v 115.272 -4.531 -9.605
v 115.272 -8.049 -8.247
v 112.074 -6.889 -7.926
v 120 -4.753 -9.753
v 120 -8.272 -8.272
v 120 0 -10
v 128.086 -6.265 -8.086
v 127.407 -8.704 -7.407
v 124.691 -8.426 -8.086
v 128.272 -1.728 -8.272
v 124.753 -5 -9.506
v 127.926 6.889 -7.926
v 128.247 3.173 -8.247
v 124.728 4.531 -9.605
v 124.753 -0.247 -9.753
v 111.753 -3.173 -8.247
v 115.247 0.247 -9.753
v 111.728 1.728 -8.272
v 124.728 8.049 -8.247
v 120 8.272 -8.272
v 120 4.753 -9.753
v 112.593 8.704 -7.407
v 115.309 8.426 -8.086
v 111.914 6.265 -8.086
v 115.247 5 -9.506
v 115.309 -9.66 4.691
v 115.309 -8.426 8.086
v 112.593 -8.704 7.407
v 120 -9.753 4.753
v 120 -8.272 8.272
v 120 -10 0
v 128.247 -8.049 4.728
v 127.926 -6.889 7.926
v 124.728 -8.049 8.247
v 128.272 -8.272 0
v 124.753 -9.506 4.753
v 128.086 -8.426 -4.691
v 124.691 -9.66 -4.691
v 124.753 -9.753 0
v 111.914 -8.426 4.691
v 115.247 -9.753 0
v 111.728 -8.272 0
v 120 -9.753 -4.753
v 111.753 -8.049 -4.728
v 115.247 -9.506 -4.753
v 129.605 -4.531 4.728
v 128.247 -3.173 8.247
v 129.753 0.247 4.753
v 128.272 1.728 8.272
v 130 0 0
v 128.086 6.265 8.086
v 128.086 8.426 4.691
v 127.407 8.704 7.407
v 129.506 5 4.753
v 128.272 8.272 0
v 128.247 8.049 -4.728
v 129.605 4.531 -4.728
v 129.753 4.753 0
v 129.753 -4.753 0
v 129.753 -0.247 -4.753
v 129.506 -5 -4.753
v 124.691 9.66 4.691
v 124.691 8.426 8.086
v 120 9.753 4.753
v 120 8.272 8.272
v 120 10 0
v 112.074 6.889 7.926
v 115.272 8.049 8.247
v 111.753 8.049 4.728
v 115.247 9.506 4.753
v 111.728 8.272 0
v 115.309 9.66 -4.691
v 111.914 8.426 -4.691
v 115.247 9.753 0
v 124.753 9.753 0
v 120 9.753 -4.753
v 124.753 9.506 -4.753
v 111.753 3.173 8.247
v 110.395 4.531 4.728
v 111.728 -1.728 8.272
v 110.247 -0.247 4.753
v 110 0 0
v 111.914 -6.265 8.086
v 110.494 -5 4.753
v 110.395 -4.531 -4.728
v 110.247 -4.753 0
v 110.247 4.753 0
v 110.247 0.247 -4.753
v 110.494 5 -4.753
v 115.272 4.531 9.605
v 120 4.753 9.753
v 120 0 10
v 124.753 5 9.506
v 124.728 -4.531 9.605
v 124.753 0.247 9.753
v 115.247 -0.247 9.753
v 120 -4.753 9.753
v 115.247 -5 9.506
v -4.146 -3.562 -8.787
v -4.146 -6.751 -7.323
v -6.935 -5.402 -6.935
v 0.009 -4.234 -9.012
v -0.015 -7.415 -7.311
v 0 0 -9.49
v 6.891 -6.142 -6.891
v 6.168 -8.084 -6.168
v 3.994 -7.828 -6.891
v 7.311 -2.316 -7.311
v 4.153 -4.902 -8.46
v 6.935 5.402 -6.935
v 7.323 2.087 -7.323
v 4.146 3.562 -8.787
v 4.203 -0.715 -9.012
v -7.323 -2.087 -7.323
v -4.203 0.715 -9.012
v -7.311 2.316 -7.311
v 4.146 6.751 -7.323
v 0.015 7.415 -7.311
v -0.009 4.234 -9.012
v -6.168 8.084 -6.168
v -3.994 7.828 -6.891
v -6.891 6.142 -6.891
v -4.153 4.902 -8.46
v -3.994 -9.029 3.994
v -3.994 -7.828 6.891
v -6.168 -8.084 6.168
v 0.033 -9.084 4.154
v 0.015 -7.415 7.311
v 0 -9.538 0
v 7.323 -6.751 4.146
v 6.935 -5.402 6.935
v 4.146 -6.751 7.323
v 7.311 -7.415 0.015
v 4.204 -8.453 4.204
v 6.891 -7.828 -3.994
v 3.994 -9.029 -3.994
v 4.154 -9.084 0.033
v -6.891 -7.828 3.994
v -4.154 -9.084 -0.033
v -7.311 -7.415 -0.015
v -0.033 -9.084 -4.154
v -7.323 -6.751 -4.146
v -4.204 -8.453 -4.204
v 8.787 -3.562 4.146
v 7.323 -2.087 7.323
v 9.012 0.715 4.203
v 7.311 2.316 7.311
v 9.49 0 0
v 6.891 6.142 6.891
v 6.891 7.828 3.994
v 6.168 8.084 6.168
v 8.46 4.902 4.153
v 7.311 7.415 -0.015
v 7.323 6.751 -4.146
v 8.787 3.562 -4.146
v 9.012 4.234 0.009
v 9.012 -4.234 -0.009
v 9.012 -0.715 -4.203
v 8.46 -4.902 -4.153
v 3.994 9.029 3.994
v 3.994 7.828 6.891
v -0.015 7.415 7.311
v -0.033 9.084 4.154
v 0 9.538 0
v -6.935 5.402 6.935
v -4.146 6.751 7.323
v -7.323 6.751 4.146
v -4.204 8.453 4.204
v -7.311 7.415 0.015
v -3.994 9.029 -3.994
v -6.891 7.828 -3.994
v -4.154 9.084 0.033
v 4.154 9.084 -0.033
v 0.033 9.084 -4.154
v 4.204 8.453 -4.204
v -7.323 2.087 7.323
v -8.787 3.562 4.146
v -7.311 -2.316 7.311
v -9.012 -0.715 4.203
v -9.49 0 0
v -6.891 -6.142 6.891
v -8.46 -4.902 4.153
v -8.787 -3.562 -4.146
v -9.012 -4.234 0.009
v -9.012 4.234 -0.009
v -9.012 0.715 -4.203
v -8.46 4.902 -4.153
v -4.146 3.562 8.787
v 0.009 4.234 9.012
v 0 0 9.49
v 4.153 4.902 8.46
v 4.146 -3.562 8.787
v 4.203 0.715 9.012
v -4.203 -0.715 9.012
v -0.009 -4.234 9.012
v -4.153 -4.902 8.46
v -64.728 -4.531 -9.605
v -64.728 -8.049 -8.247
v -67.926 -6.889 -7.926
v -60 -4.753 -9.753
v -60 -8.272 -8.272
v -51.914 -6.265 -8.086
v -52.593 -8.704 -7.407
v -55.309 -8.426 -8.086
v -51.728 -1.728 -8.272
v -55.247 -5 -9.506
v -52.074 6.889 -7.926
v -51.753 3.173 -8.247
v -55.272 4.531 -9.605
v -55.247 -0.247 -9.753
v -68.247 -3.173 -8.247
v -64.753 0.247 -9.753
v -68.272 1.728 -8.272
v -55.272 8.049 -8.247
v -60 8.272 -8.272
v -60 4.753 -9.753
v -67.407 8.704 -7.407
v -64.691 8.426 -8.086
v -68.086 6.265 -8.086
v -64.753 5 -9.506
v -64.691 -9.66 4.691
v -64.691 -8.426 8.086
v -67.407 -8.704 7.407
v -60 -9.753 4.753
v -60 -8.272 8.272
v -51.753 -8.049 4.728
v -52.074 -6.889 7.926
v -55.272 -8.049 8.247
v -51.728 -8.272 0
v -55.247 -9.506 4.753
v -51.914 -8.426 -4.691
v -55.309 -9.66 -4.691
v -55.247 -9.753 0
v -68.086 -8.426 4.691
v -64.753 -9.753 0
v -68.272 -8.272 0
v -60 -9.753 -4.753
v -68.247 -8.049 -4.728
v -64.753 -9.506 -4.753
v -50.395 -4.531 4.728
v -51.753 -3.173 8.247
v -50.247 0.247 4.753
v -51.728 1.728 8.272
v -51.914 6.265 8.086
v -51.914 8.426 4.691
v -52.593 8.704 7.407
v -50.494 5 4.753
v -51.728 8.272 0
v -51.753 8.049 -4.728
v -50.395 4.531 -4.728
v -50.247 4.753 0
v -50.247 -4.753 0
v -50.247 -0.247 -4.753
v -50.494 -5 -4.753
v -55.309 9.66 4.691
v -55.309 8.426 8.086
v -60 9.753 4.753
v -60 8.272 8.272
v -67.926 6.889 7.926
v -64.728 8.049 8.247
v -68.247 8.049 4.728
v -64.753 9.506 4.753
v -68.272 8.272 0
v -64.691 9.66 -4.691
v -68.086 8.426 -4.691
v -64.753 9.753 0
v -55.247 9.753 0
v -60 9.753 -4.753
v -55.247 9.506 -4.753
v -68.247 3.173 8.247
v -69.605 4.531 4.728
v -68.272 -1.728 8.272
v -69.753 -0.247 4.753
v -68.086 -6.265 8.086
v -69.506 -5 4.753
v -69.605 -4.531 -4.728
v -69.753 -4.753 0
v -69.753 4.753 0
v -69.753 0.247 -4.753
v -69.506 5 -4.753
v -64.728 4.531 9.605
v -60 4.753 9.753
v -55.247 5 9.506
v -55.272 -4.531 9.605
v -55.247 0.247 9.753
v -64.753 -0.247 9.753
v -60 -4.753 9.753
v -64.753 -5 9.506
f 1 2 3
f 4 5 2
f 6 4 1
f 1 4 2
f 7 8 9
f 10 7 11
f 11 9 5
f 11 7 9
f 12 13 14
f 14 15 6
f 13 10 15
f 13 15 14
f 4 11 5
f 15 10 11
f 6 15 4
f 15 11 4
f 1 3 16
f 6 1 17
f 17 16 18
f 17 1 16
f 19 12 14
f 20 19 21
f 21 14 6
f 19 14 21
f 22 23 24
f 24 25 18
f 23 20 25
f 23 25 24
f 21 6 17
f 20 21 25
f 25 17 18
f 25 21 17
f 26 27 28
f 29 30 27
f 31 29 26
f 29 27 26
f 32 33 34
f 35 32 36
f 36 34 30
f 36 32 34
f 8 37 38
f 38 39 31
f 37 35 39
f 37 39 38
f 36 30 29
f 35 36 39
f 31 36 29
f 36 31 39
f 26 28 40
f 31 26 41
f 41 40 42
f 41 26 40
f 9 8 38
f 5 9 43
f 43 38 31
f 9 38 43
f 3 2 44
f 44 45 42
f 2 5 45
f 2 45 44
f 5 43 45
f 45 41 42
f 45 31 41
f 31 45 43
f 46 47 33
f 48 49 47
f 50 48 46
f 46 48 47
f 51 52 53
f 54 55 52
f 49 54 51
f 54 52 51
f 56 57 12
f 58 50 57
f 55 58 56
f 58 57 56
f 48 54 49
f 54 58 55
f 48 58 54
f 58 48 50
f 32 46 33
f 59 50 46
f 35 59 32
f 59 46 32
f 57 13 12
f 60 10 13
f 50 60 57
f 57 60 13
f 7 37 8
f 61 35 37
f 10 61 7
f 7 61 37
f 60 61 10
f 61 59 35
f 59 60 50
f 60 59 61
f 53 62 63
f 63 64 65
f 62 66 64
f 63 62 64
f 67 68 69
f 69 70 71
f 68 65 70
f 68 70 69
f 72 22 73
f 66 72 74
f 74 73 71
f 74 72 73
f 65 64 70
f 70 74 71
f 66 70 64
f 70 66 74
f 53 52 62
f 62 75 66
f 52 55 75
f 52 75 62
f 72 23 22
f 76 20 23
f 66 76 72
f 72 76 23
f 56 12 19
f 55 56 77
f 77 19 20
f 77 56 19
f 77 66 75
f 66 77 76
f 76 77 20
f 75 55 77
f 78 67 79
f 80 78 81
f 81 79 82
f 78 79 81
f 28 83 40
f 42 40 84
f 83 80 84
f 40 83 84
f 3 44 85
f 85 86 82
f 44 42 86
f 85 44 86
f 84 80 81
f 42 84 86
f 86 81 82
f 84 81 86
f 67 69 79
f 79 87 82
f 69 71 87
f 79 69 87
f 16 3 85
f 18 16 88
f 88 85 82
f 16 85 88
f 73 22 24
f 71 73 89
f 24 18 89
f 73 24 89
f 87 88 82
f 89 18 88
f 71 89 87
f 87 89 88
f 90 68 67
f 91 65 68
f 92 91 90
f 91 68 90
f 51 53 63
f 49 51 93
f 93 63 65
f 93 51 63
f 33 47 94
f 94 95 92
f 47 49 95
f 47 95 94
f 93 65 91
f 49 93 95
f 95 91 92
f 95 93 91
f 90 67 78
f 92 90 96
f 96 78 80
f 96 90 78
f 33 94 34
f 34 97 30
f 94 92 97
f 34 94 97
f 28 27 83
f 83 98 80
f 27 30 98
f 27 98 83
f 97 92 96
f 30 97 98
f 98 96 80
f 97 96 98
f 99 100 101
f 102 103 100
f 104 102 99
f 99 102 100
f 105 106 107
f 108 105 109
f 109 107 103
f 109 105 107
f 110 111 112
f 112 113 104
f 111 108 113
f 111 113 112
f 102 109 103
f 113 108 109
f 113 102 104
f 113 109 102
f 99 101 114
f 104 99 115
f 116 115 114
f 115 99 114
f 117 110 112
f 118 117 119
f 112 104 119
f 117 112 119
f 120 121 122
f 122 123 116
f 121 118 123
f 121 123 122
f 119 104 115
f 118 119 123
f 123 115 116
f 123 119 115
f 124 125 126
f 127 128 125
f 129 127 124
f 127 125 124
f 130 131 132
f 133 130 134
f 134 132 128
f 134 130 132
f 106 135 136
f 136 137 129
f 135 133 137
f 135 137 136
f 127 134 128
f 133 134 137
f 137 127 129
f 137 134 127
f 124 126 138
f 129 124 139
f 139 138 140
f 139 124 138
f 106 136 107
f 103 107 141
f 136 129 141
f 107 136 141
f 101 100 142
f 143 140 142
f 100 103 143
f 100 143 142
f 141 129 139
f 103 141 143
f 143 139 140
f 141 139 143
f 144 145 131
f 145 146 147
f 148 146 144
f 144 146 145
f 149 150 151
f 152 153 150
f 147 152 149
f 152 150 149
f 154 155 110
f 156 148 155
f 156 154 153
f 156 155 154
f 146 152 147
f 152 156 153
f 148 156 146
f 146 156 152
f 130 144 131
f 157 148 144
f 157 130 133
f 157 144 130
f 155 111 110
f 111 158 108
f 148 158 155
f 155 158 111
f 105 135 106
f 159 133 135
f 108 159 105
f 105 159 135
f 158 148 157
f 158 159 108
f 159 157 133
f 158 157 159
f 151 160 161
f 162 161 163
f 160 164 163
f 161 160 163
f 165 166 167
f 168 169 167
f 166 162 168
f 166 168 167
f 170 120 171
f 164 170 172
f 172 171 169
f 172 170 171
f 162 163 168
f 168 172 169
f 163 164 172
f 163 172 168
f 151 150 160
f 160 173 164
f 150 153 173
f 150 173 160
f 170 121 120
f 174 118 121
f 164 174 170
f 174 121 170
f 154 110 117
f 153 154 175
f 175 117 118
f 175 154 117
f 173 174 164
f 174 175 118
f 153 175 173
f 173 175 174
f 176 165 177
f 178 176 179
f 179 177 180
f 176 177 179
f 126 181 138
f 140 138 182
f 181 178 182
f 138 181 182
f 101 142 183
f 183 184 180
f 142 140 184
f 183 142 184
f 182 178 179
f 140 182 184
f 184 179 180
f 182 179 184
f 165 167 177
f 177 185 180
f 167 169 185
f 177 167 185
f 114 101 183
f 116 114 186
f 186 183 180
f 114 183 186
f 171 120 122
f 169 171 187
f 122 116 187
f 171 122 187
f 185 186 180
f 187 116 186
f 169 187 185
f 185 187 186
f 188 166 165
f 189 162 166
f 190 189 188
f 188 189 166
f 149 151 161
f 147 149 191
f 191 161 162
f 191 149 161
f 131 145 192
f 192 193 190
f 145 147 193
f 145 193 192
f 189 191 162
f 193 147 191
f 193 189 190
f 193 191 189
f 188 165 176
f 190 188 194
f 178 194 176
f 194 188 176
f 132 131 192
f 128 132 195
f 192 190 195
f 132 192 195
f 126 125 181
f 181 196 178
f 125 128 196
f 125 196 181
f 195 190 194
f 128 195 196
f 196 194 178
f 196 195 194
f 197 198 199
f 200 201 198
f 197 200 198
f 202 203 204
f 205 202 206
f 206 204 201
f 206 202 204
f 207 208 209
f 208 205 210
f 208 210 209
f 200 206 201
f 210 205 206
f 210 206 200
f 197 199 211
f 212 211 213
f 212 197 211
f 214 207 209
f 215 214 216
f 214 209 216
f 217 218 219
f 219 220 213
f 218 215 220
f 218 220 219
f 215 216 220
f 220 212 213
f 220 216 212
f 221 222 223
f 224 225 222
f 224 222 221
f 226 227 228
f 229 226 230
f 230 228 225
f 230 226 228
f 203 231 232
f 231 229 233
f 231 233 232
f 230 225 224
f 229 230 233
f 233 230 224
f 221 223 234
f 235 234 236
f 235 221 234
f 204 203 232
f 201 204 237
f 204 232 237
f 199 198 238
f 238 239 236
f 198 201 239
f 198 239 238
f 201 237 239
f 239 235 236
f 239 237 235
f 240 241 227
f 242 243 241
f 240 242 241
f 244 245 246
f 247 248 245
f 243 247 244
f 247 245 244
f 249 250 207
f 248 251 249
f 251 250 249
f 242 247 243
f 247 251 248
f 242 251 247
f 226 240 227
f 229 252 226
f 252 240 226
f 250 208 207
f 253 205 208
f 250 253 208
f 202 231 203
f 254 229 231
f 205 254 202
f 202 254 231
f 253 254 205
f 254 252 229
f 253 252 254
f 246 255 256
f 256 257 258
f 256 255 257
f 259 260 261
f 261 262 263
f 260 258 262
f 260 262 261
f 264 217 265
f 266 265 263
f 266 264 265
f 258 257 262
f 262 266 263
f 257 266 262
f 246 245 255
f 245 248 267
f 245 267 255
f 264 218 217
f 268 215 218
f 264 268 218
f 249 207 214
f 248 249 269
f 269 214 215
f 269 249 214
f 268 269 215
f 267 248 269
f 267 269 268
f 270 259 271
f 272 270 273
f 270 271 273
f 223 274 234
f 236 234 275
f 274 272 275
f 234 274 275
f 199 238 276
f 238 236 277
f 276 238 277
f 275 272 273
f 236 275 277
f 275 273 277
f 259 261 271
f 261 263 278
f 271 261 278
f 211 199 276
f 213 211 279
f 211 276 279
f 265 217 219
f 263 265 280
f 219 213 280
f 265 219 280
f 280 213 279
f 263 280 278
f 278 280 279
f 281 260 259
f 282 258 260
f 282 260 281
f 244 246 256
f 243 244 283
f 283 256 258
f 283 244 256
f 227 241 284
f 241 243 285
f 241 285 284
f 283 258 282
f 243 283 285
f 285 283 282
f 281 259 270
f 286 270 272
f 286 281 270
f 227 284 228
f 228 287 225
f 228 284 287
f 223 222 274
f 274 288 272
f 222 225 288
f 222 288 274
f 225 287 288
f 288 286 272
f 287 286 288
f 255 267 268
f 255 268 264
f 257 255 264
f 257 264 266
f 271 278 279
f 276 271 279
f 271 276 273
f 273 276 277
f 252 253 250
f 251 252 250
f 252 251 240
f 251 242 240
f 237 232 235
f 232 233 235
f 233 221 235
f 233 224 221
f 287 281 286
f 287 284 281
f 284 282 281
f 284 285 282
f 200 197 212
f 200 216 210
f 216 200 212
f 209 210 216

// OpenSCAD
//demo mesh
Flat_treshold=0.009;
  //mesh=trimesh(cubemesh4() );
mesh=trimesh(cubemesh3() );
  //  mesh= (diamond() );

 // mesh=fp_flip(bunny());

echo(len(  mesh[0]),len(mesh[1]));

midmesh =  relax( tesselate( (mesh),2)) ;
 dmaesh= fp_decimate( midmesh );
 //nm = fp_decimate (tesselate(dmaesh,0));


 newmesh=relax (midmesh);
translate ([120,0,0]) polyhedron(midmesh[0], midmesh[1]);

// translate ([60,0,0]) polyhedron(nm[0], nm[1]);
translate ([ 0,0,0]) polyhedron(newmesh[0], newmesh[1]);

translate ([-60,0,0]) polyhedron(dmaesh[0], dmaesh[1]);
  // for (i = [0: len(newmesh) - 1]) echo(newmesh[i]);
echo(len( midmesh[0]),len(dmaesh[0]));
echo(len( dmaesh[0]),len(dmaesh[0]));


function fp_decimate (m,i=0,changed=0  )=
let(points=m[0],faces=m[1],n= neighbours(m) )
i<len(points)-1?
let(
removies=[for(k=[0:max(0, len(n[i])-1 )] ) faces[n[i][k]]],
 r=flattness(m,removies) 
//, e=echo(i,"removies",removies,"flattness",r)
)

r<=Flat_treshold? 
let(
newm=fp_decimateinidex(m,i,removies),
newch=len(newm[0])==len(m[0])?changed:changed+1,
newi=len(newm[0])==len(m[0])?i  :i
)
fp_decimate (newm,newi,newch  ) 
:fp_decimate (m,i+1,changed  )
:
changed>0?

 fp_decimate( m)
:
fusepoints(m)

;

/*needs change*/

function fp_decimateinidex(m,j,n)=
let( points=m[0],faces=m[1])
let(
removies=n,
newfaces=fp_removevertex(m,removies,j,alt=3),
r= flattness(m,newfaces),
h= flattness(m,removies)

) 
r<=h?
    let(nn=notneighboursofi (m,j),keepers= [for(k=[0:len(nn)-1]) faces[nn[k]]]
 //, e=echo("n",removies,"j",keepers)
)
    [points, concat(keepers,newfaces)]
    :
m
;
function fp_removevertex(m,removies,vertex,alt=0)=
let(points=m[0] )
let(

n= avrg([for(i=[0:max(0,len(removies)-1)])
p2n(  [points[removies[i][0]], points[removies[i][1]], points[removies[i][2]]])    ] ),


d= fp_tricylceb(removies,vertex),
c= fp_segorder(d),
e=fp_segcollapse(c),
g=shuffle(e,alt-round(rnd(2))),
f=fp_triangulate(m,g,n)
//,eco=echo( len(d),len(c))
)
 len(removies)>2&&len(c)==len(d)&&len(f)+2==len(removies)?f: removies 
;
function flattness(m,n)=

let(points=m[0],faces=m[1], 

normals=[for(i=[0:max(0,len(n)-1)])p2n(
 [
//let(e=echo("normals",n))
points[n[i][0]],
points[n[i][1]],
points[n[i][2]] 
])

],
ne=normeq(normals)



)  

ne
;


/*needs change*/

function newflattness(m)=

let(points=m[0],faces=m[1],

normals=[for(i=[0:max(0,len(m)-1)])p2n(m[i])

],
ne=normeq(normals)


) 
ne
;
function fp_glue(m)= let (
   hashed = fp_addhash(fp_flatten(m)), /*flatten and pair points with hash*/
   sorted = fp_hashQS(hashed),/*sort by hash*/
   unique = fp_unique(sorted),/*unique by hash*/
   newmesh = [fp_removehash(unique), fp_relink(unique, m)])/* combine to new mesh*/
 newmesh;
 function fusepoints(m) =
 let (
   privatetized = fp_privatetize(m), /* convert indexed polyhedron */
 newmesh= fp_glue(privatetized))
 newmesh;

 function fp_privatetize(m) = 
/* convert indexed polyhedron to vetrtex polygons with private vertex*/
 let (p = m[0], f = m[1], l = max(0,len(f) - 1))[
   for (i = [0: l])[     for (j = [0: len(f[i]) - 1]) p[f[i][j]]   ]];

 function fp_flatten(l) = [   for (a = l)     for (b = a) b ];
 
 function fp_addhash(m) = 
/*pair each point with a hash of the point*/
[   for (i = [0: len(m) - 1])[fp_encode(m[i]), m[i]] ];

 function fp_encode(v) =
 let (xseed = round(fp_rnd(1e8, -1e8, round(v.x * 1e6))),
   yseed = round(fp_rnd(1e8, -1e8, xseed + round(v.y * 1e6))),
   zseed = round(fp_rnd(1e8, -1e8, yseed + round(v.z * 1e6))),
   hash =   round(fp_rnd(1e8, -1e8, zseed)))
 hash;

 function fp_hashQS(arr) = !(len(arr) > 0) ? [] :
 let (pivot = arr[floor(len(arr) / 2)][0],
 lesser = [ for (y = [0: len(arr) - 1]) if (arr[y][0] < pivot) arr[y] ],
 equal = [ for (y = [0: len(arr) - 1]) if (arr[y][0] == pivot) arr[y] ],
 greater = [ for (y = [0: len(arr) - 1]) if (arr[y][0] > pivot) arr[y] ])
 concat(fp_hashQS(lesser), equal, fp_hashQS(greater));

 function fp_unique(m) = [   for (i = [0: len(m) - 1])     if (m[i] != m[i - 1]) m[i] ];

 function fp_rnd(a = 1, b = 0, s = []) = s == [] ? (rands(min(a, b), max(   a, b), 1)[0]) : (rands(min(a, b), max(a, b), 1, s)[0]); 

 function fp_removehash(m) = [   for (i = [0: len(m) - 1]) m[i][1] ];
 function fp_relink(p, f) =
/*convert polygons with private vertex to indexed by searching for hash matches  */
 let (l = len(f) - 1)[   for (i = [0: l])[     for (j = [0: len(f[i]) - 1]) search(fp_encode(f[i][j]), p)[0]] ];
 
 function fp_flip(w)=[w[0],[for(i=[0:len(w[1])-1])[w[1][i][0],w[1][i][2],w[1][i][1]]]];

function lerp(start, end, bias) = (end * bias + start * (1 - bias));

function relax(m, c =  2,nn=0) = 
let(points=m[0], faces=m[1], n=nn==0?neighbours(m):nn)
c > 0 ?
let(
midpoints = 
[ for (i = [0: len(faces) - 1]) avrg( 
[points[faces[i][0]], points[faces[i][1]], points[faces[i][2]]]
) ], 

points2 = [ for (i = [0: len(points) - 1]) len(
n[i]) > 0 ?  avrg([ for (j = [0: len(n[i]) - 1]) midpoints[ n[i] [j]]
 ])  : points[i] ])

relax([points2, faces]  , c - 1,n)
:
 [points, faces];

function neighbours (m)=let(points=m[0],faces=m[1]) [ for (i = [0: len(points) - 1])[ for (j = [0: len(faces) - 1])
 if (faces[j][0] == i || faces[j][1] == i || faces[j][2] == i || faces[j][3] == i) j] ];
function notneighbours (m)=let(points=m[0],faces=m[1]) [ for (i = [0: len(points) - 1])[ for (j = [0: len(faces) - 1])
 if ( (faces[j][0] != i && faces[j][1] != i && faces[j][2] != i && faces[j][3] != i)) j] ];
function neighboursofi (m,i)=let(points=m[0],faces=m[1])
  [ for (j = [0: len(faces) - 1])
 if (faces[j][0] == i || faces[j][1] == i || faces[j][2] == i || faces[j][3] == i) j] ;
function notneighboursofi (m,i)=let(points=m[0],faces=m[1])
  [ for (j = [0: len(faces) - 1])
 if ( (faces[j][0] != i && faces[j][1] != i && faces[j][2] != i && faces[j][3] != i)) j] ;
function addl(l, c = 0) = c < len(l) - 1 ? l[c] + addl(l, c + 1) : l[
 c];
function avrg(l) = len(l) > 1 ? addl(l) / (len(l)) : l;




function shuffle(b,l=1)=let(
c=concat( [for(i=[1:len(b)-1])b[i]],[b[0]]))
l>0?shuffle(c,l-1):c
;
function fp_tricylceb(b,p)=[for(i=[0:len(b)-1])fp_tricycle (b[i],p)];

function fp_tricycle(f,p)=
fp_is_equal(f[0],p)?
[f[1],f[2]]:
     let(f1=[f[1],f[2],f[0]])
    fp_is_equal(f1[0],p)?
        [f1[1],f1[2]]:
        let(f2=[f1[1],f1[2],f1[0]])
        fp_is_equal(f2[0],p)?[f2[1],f2[2]]:
        f;

function fp_triangulate(m,a,n ,count=0)=
let(points=m[0],faces=m[1])
count>len(a)?
a
:
len(a)<=3?
[[a[0],a[1],a[2]]]:
sign(dot(p2n([points[a[0]],points[a[1]],points[a[2]]  ]),n))>0?
let(b=concat([for(i=[2:len(a)-1])a[i]],[a[0]] )) 
concat([[a[0],a[1],a[2]]],fp_triangulate( m,shuffle(b,2),n )):fp_triangulate(m, shuffle(a,1),n,count+1 );

function fp_trimeshulate(a)=len(a)>3?let(b=concat([for(i=[2:len(a)-1])a[i]],[a[0]] )
) concat([[a[0],a[1],a[2]]],fp_trimeshulate(shuffle(b,2))):[[a[0],a[1],a[2]]];



 function fp_is_equal(a, b, d=1e-16) = (a==b) || (abs(a-b)<d) || (norm(a-b)<d);
    function flatten(l) = [ for (li = l, lij = li) lij ];

function rnd(a = 1, b = 0) = (rands(min(a, b), max(a, b), 1)[0]);

 function fp_segorder(n,acc=0,c=0)=c<=len(n)-1?let(newacc= (acc==0)?[n[0]]:let(lookfor= acc[0][0]) concat([for(i=[0:len(n)-1])if(fp_is_equal(lookfor,n[i][1])==true)n[i]],acc ))fp_segorder(n,newacc,c+1):acc;

function fp_segcollapse(n)=
[for(i=[0:len(n)-1])n[i][0]];

function normeq(pl) = 

let (list= [
 for (i = [0: len(pl) - 1],j = [0: len(pl) - 1])
 
 (-1 + dot(pl[i], pl[j])  )
   ]
,
sums = avrg(list) )
 
abs(sums)
 ;

function p2n4(p) =un(p2n(p0,p1,p3)+p2n(p3,p1,p2));
function p2n(p) =
let (pa=p[0], pb=p[1], pc=p[2],
u = pa - pb, v = pa - pc) un([u[1] * v[2] - u[2] * v[1], u[2] *
 v[0] - u[0] * v[2], u[0] * v[1] - u[1] * v[0]
]);
function un(v) = v / max(len3(v), 0.000001) * 1; // div by zero safe unit normal
function dot(v1, v2) = v1[0] * v2[0] + v1[1] * v2[1] + v1[2] * v2[2];
function addl(l, c = 0) = c < len(l) - 1 ? l[c] + addl(l, c + 1) : l[
 c];
function len3(v) = len(v) > 1 ? sqrt(addl([
 for (i = [0: len(v) - 1]) pow(v[i], 2)
])) : len(v) == 1 ? v[0] : v;

function  trimesh (t)=
let(
t1=t[1],
t2=fp_flatten([for(i=[0:len(t1)-1]) 
 (len( t1[i])==3)?[t1[i]]:[[t1[i][0],t1[i][1],t1[i][2]],[t1[i][0],t1[i][2],t1[i][3]]]     ] )
)[t[0],t2]
;
function tesselate(m,c=1)=
c>=1?
 let (
   pr = fp_privatetize(m), /* convert indexed polyhedron */

 subdv=fp_flatten([for(i=[0:max(0,len(pr)-1)])let(
pr01=lerp(pr[i][0],pr[i][1],0.5),
pr12=lerp(pr[i][1],pr[i][2],0.5),
pr20=lerp(pr[i][2],pr[i][0],0.5)
)[
[pr[i][0],pr01,pr20],
[pr[i][1],pr12,pr01],
[pr[i][2],pr20,pr12],
[pr01,pr12,pr20]

]
]),
 
  newmesh =   fp_glue(subdv)
)
tesselate(newmesh,c-1)
:

m;
 

module trender(t) {
 C0 = (un(rndc()) + [2, 0, 0]);
 C1 = (un(rndc()) + [2, 2, 0]);
 C2 = (un(rndc()) + [0, 2, 2]);
 for (i = [0: max(0, len(t[1]) - 1)]) {
 n = un(p2n(t[0][t[1][i][0]], t[0]
 [t[1][i][1]], t[0][t[1][i][
 2
 ]]));
 color(un((C0 * abs(n[0]) + C1 * abs(n[1]) + C2 * abs(n[2]) + [
 1, 1, 1
 ] * abs(n[2])) / 4)) polyhedron(t[0], [t[1][i]]);
 }
}
function rndc(a = 1, b = 0,seed) = [rnd(a, b,seed),
 rnd(a, b,seed+1), rnd(a, b,seed+2)
];
function bunny()=[[[33.718,-8.247,33.616],[-30.065,-22.111,41.454],[1.142,14.457,35.998],[20.205,-17.34,49.075],[36.378,-2.827,7.022],[-11.251,13.5,5.136],[29.105,-18.728,7.239],[-9.845,8.083,9.951],[-36.86,-24.079,60.289],[-28.976,-3.302,3.436],[-11.413,-13.526,50.148],[28.736,-0.816,42.915],[-32.116,4.195,42.182],[29.812,-7.088,2.935],[-37.993,-15.409,34.838],[-28.78,-18.857,66.373],[-29.289,21.548,77.615],[-28.191,23.665,69.162],[-36.226,-11.242,66.87],[31.967,2.895,30.506],[-25.318,1.605,64.068],[-41.72,-13.563,47.396],[3.505,-27.667,8.246],[18.251,9.502,40.482],[-40.705,-8.309,57.649],[-34.759,-14.864,24.435],[41.326,-8.903,12.497],[7.937,-25.727,1.639],[0.142,18.861,18.906],[37.372,0.543,12.665],[11.469,-25.566,39.178],[-11.3,-25.322,6.98],[16.983,0.961,50.904],[25.417,10.084,22.882],[12.196,16.124,13.812],[-38.798,-23.136,44.566],[-6.906,16.568,23.283],[-11.406,5.707,70.997],[27.876,3.576,10.072],[-29.124,6.104,23.795],[30.252,-19.533,18.403],[-24.95,-3.186,68.402],[-21.5,4.288,1.733],[-20.217,0.035,59.846],[-16.111,-1.157,53.825],[9.791,18.388,28.806],[-20.449,-9.927,10.118],[-5.697,-29.44,3.937],[-14.075,-24.543,1.192],[-38.314,-4.065,30.749],[-17.348,-6.564,61.51],[39.723,-14.873,17.026],[-24.142,-11.883,1.318],[4.044,-18.973,49.654],[-25.128,-21.576,4.037],[28.884,-15.239,42.197],[-7.042,-23.574,16.146],[-22.782,1.057,13.904],[-30.957,-28.833,46.933],[-13.723,10.348,24.112],[-6.4,7,79.935],[0.38,8.58,73.547],[-2.751,-29.774,24.603],[32.871,-16.125,29.207],[-3.623,17.983,31.576],[17.513,4.686,2.883],[-30.017,-27.275,56.561],[13.323,-29.14,13.068],[-20.244,-21.378,18.476],[-20.735,-20.229,49.671],[34.577,-0.469,19.663],[-32.728,2.082,59.206],[1.448,8.004,45.899],[-21.1,-24.65,32.38],[-3.299,14.822,3.265],[37.681,-9.851,21.953],[10.732,-31.947,27.781],[-25.458,13.814,68.264],[14.963,11.754,4.948],[-21.548,-8.801,67.863],[2.005,-5.173,1.969],[-23.472,3.741,51.505],[21.968,-9.013,50.599],[-9.451,7.934,17.546],[41.184,-5.284,20.179],[-39.539,-2.907,46.751],[-39.019,-9.922,42.553],[-16.487,10.221,37.797],[-9.537,-0.368,72.53],[-13.553,-22.428,41.139],[-5.875,-25.824,33.532],[10.433,-17.548,2.653],[-40.968,-17.45,57.613],[-32.842,15.053,71.785],[-4.31,-4.034,51.575],[10.947,-7.696,54.207],[1.296,-30.04,33.917],[-33.833,1.324,66.787],[-27.494,-6.782,16.239],[-21.944,-17.558,61.153],[-38.475,-27.624,50.311],[24.879,-24.385,33.536],[-21.259,-16.919,7.059],[-21.259,-16.919,7.059],[-21.259,-16.919,7.059]],[[80,91,48],[27,48,91],[68,98,46],[48,52,80],[98,25,49],[54,52,48],[42,74,80],[52,42,80],[42,5,74],[6,13,26],[25,98,68],[9,42,52],[46,103,68],[58,35,1],[1,35,21],[80,74,65],[100,35,58],[80,65,13],[91,80,13],[27,91,6],[6,91,13],[47,48,27],[51,75,40],[87,59,39],[5,7,74],[2,72,23],[28,74,7],[54,104,52],[64,28,36],[60,61,37],[39,57,98],[64,45,28],[34,74,28],[31,48,47],[102,54,31],[7,42,57],[59,57,39],[12,81,87],[37,43,41],[2,45,64],[74,34,78],[41,43,20],[59,7,57],[28,45,34],[87,39,12],[45,33,34],[37,41,60],[12,71,81],[34,33,78],[72,2,87],[38,29,65],[65,29,4],[49,12,39],[50,79,99],[94,72,44],[23,11,19],[27,6,67],[72,81,44],[44,81,43],[87,81,72],[70,75,84],[43,81,20],[45,2,23],[29,70,84],[19,33,23],[33,45,23],[32,72,94],[83,7,59],[98,57,46],[57,9,46],[71,85,24],[97,71,24],[97,93,71],[85,12,49],[49,39,98],[9,57,42],[32,94,95],[23,72,32],[71,93,17],[18,24,92],[5,42,7],[86,1,21],[83,59,36],[83,36,7],[36,28,7],[64,36,59],[23,32,11],[93,16,17],[12,85,71],[18,8,15],[92,35,100],[87,2,59],[22,62,56],[9,52,46],[8,92,100],[90,62,96],[14,1,86],[93,97,16],[14,25,73],[25,68,73],[1,14,73],[16,77,17],[30,90,96],[2,64,59],[8,100,66],[77,71,17],[32,82,11],[41,79,60],[15,79,41],[3,55,82],[82,55,11],[10,94,44],[44,50,10],[20,77,16],[79,88,60],[20,71,77],[99,69,10],[21,92,24],[50,99,10],[16,41,20],[8,18,92],[97,41,16],[22,27,67],[51,84,75],[15,66,99],[97,18,41],[55,0,11],[4,26,13],[55,63,0],[70,38,33],[102,46,52],[14,49,25],[75,0,63],[74,78,65],[19,70,33],[38,65,78],[33,38,78],[86,85,49],[97,24,18],[65,4,13],[86,49,14],[70,29,38],[50,61,88],[6,26,51],[37,61,43],[30,76,101],[40,101,67],[101,76,67],[30,101,3],[101,40,63],[55,3,101],[40,75,63],[22,47,27],[67,6,40],[60,88,61],[43,50,44],[19,11,0],[63,55,101],[26,4,29],[84,26,29],[31,54,48],[69,99,66],[58,1,69],[69,66,58],[76,62,67],[3,53,30],[67,62,22],[43,61,50],[30,96,76],[96,62,76],[22,31,47],[53,89,30],[89,90,30],[95,3,82],[56,31,22],[95,53,3],[10,89,53],[90,56,62],[90,73,56],[40,6,51],[89,73,90],[21,85,86],[56,68,31],[0,75,70],[73,68,56],[69,89,10],[68,102,31],[84,51,26],[15,41,18],[89,69,1],[1,73,89],[92,21,35],[82,32,95],[24,85,21],[0,70,19],[71,20,81],[8,66,15],[79,50,88],[66,100,58],[94,53,95],[15,99,79],[10,53,94]]];


function diamond()=



[[[-4.10863, -0.140602, -3.6055], [-3.84601, -3.60175, -1.47346], [-3.97796, -4.24691, -0.613285], [-2.53813, -0.848251, -6.37256], [-2.18844, -1.82373, -4.13948], [-0.0333337, -0.848251, -6.37256], [-0.107152, -1.93214, -3.8401], [-1.97693, -1.14585, -5.02233], [-0.274562, -1.22818, -4.66476], [-3.44904, -3.49388, -1.8379], [-2.53813, -6.1872, 0.213072], [-0.037514, -3.74431, -1.36103], [1.90021, -5.55326, 1.49797], [-2.17048, -4.75789, 0.0422999], [0.38598, -5.22305, 0.760223], [-4.55809, -2.31577, -1.67114], [-6.44044, -0.0759498, -0.538324], [-6.32277, -1.73312, 0.916171], [-5.9166, -0.0467461, -1.88034], [-5.65828, -2.40612, -0.340622], [-6.96031, -0.89379, 0.448986], [-6.65543, -1.13852, -0.358017], [-2.88119, -2.59327, -3.09619], [-0.0989006, -2.70754, -2.83311], [-3.60055, -1.31693, -3.26812], [-2.53813, -2.6279, 0.213072], [-0.0333337, -0.848251, -1.98214], [-0.0333337, -2.6279, 0.213072], [2.15047, -1.95664, -3.656], [3.80216, -1.72573, -3.28922], [1.56304, -1.48258, -4.06836], [3.83668, -0.578218, -3.60172], [2.68802, -3.77158, -1.23882], [2.83805, -5.71606, 1.54781], [5.02919, -3.92323, -0.983753], [3.92337, -5.44133, 1.27551], [2.72541, -4.80807, 0.236576], [5.02994, -4.6583, 0.245474], [7.48106, -0.848251, -4.17735], [7.48106, -4.40755, -1.98214], [6.60705, -3.53789, 1.16426], [2.83029, -2.38095, -3.21484], [5.84927, -2.95745, -2.39152], [2.47146, -0.848251, -1.98214], [2.47146, -2.6279, 0.213072], [6.11744, -0.664958, -2.92074], [6.43254, -3.13239, -0.469602], [7.22257, -2.26381, -1.08929], [6.65182, -0.574654, -2.63706], [8.58868, -1.57387, 0.498089], [9.98586, -2.6279, 0.213072], [8.86667, -0.790335, 0.374336], [8.84603, -0.149826, 1.18825], [-4.87593, 1.50124, -3.97146], [-4.70862, 2.29828, -4.04328], [-2.53813, 0.931399, -6.37256], [-0.0333337, 0.931399, -6.37256], [-2.53813, 2.71105, -6.37256], [-1.92777, -0.992021, -5.03321], [-0.0333337, 2.71105, -6.37256], [-0.995141, 0.58903, -5.22706], [-2.83857, 2.64671, -4.83497], [-0.750299, 2.94568, -5.55327], [-4.06563, 3.93282, -3.18426], [-6.40319, 0.425744, -0.412854], [-5.75953, 0.527687, -2.25537], [-6.99193, 0.969201, 1.4556], [-5.02031, 3.91375, -2.41588], [-6.36916, 1.93535, 0.391189], [-7.54773, 2.71105, 0.213072], [-5.83043, 2.72602, -0.366366], [-0.0333337, 4.4907, -6.37256], [-2.95489, 4.38504, -3.58535], [-0.877111, 5.02743, -4.1213], [-2.53813, 6.27035, -4.17735], [-0.0333337, 6.27035, -4.17735], [-4.76143, 4.15636, -2.33779], [-4.16403, 4.15885, 0.111998], [-3.22708, 5.14215, -0.9632], [-1.14664, 5.60559, -1.71968], [-1.66131, 5.80306, -0.514935], [-2.62796, 5.5636, 0.410056], [-1.52977, 5.81804, -0.660227], [-0.446236, 5.67479, 0.418208], [-1.75275, 5.8585, -0.193377], [-1.41853, 5.85982, -0.269016], [-4.54762, -3.75071, 3.14745], [-3.71454, -3.78975, 3.72922], [-2.53813, -6.1872, 2.40828], [1.95471, -5.51812, 2.02936], [-1.98562, -4.49762, 2.43775], [0.605838, -5.10006, 2.73186], [-0.0333337, -6.1872, 4.60349], [-2.1796, -4.16354, 4.20972], [0.220772, -4.657, 5.04817], [-6.28168, -1.83123, 1.66813], [-5.33131, -3.05158, 3.25984], [-6.7583, -0.821015, 1.81635], [-6.00906, -0.691373, 3.23509], [-5.01305, -2.50056, 4.10666], [-7.54773, -0.848251, 4.60349], [-5.05032, -1.18996, 4.9624], [-2.53813, -2.6279, 2.40828], [-2.13919, -2.76434, 5.27905], [-0.478659, -3.32594, 5.65739], [-2.8572, -1.53707, 5.73698], [-0.0333337, -0.848251, 4.60349], [1.40225, -3.9013, 6.19035], [-5.04293, -0.848251, 6.7987], [-0.907379, -2.11602, 6.31779], [0.598011, -2.49364, 6.82502], [-1.09261, -1.85583, 6.29929], [0.925692, -0.912368, 6.68243], [2.47146, 2.71105, -6.37256], [1.57593, 0.832456, -4.50757], [3.86489, 1.76097, -4.05165], [1.83142, 2.49517, -4.66334], [3.50857, 2.16194, -4.07357], [7.48106, 0.931399, -4.17735], [7.48106, 2.71105, -4.17735], [0.927679, 4.60082, -3.54521], [4.97626, 4.4907, -4.17735], [5.60468, 1.48375, -3.48449], [3.02465, 3.60509, -3.20588], [4.69642, 3.79178, -2.32503], [4.97626, 2.71105, 0.213072], [7.28769, 1.33692, -2.80066], [7.10103, 3.30374, -1.62038], [8.91038, 0.594316, 0.471455], [8.79874, 0.177289, 1.19532], [7.25544, 3.28327, -1.09866], [9.98586, 2.71105, 0.213072], [2.38489, 4.5449, -2.73796], [4.94993, 4.02157, -1.7848], [2.47146, 6.27035, -1.98214], [2.25305, 5.13412, 1.26447], [5.98923, 4.14473, 0.694604], [2.47146, 6.27035, 0.213072], [4.97626, 6.27035, 0.213072], [6.10839, 3.74254, -1.03395], [6.44784, 3.85258, 0.124204], [3.63356, -5.93983, 1.99458], [4.29407, -5.80738, 1.96402], [2.1521, -5.36055, 3.48979], [3.60251, -5.58484, 3.54027], [4.63112, -5.61119, 1.90199], [4.43858, -5.3304, 3.31399], [2.56493, -5.20374, 5.66859], [6.64743, -4.16945, 4.61148], [6.58158, -3.88963, 2.51602], [6.69287, -4.22084, 4.47167], [4.97626, -2.6279, 2.40828], [6.20177, -3.5936, 5.36913], [6.10459, 0.186099, 5.5842], [2.47146, -6.1872, 6.7987], [3.07735, -4.60228, 6.48149], [4.68258, -4.24091, 5.85724], [7.82046, -2.66139, 2.57944], [8.30424, -0.773894, 2.36074], [6.92055, -3.89612, 4.68602], [8.72116, -0.105558, 1.58722], [7.42911, -0.759798, 4.85241], [2.83186, -2.96797, 7.53465], [5.33017, -2.67575, 6.59174], [3.03607, -0.677601, 7.2506], [2.47146, -2.6279, 8.99391], [5.45436, -0.369361, 6.53547], [2.47146, -0.848251, 8.99391], [6.58971, -2.335, 6.0984], [6.71974, -1.44671, 6.08463], [-7.01509, 0.965476, 1.33196], [-5.93065, 1.78085, 2.42897], [-7.54773, 2.71105, 2.40828], [-4.25257, 3.10903, 3.81421], [-4.43171, 1.05919, 4.67493], [-3.97833, 2.70613, 4.44912], [-3.54766, 3.65164, 3.31828], [-2.1615, 0.698256, 5.44592], [-1.45723, 3.44114, 3.69473], [-0.612926, 1.46768, 5.68235], [-2.62304, 2.53125, 4.88518], [-0.354467, 2.18707, 5.50257], [-3.87248, 3.96791, 1.69684], [-5.04293, 4.4907, 4.60349], [-3.00649, 4.61703, 2.02873], [-0.272702, 4.3237, 2.4991], [-2.53813, 6.27035, 2.40828], [-2.53813, 4.4907, 4.60349], [-0.0333337, 6.27035, 2.40828], [0.867876, 3.48696, 3.71022], [-0.81646, -0.0217327, 5.9989], [0.883914, 1.53673, 6.15091], [-2.53813, 2.71105, 6.7987], [1.23386, 1.82958, 5.98969], [2.47146, 2.71105, 2.40828], [2.47146, 0.931399, 4.60349], [5.95758, 3.73293, 3.30952], [5.1154, 1.90952, 5.45984], [2.52823, 2.7118, 4.86052], [5.17682, 2.81784, 4.6537], [8.6324, 1.13685, 2.31573], [8.73021, 0.22765, 1.5864], [7.20341, 2.796, 2.56305], [7.80901, 0.297881, 3.82064], [6.6867, 2.07576, 3.69413], [2.85691, 4.93536, 1.7438], [5.42898, 4.50011, 2.37199], [2.47146, 6.27035, 2.40828], [2.57168, 3.62621, 3.54726], [4.97626, 6.27035, 2.40828], [4.18949, 3.69698, 3.4517], [3.26533, 1.08488, 7.0259], [4.41927, 1.24853, 6.66006], [2.66961, 1.95828, 5.88189], [3.93665, 1.97327, 5.74871], [6.38898, 3.73076, 1.44543]], [[19, 2, 1], [19, 1, 15], [21, 19, 15], [21, 15, 18], [24, 22, 4], [24, 4, 7], [31, 29, 42], [31, 42, 45], [42, 34, 37], [42, 37, 46], [48, 47, 49], [48, 49, 51], [65, 18, 0], [65, 0, 53], [66, 20, 16], [66, 16, 64], [67, 65, 53], [67, 53, 54], [70, 68, 65], [70, 65, 67], [76, 67, 54], [76, 54, 63], [77, 70, 67], [77, 67, 76], [84, 81, 78], [84, 78, 80], [82, 79, 83], [82, 83, 85], [91, 89, 12], [91, 12, 14], [96, 86, 2], [96, 2, 19], [97, 95, 17], [97, 17, 20], [99, 87, 86], [99, 86, 96], [101, 99, 96], [101, 96, 98], [110, 107, 94], [110, 94, 104], [111, 109, 103], [111, 103, 105], [115, 31, 45], [115, 45, 122], [117, 115, 122], [117, 122, 124], [126, 48, 51], [126, 51, 128], [127, 126, 128], [127, 128, 130], [120, 116, 123], [120, 123, 132], [139, 127, 130], [139, 130, 140], [37, 35, 142], [37, 142, 145], [147, 144, 141], [147, 141, 143], [145, 142, 146], [145, 146, 148], [49, 40, 149], [49, 149, 157], [51, 49, 157], [51, 157, 158], [157, 149, 150], [157, 150, 159], [158, 157, 159], [158, 159, 161], [152, 148, 156], [152, 156, 163], [161, 159, 168], [161, 168, 169], [170, 97, 20], [170, 20, 66], [173, 171, 68], [173, 68, 70], [174, 101, 98], [174, 98, 171], [175, 174, 171], [175, 171, 173], [182, 173, 70], [182, 70, 77], [189, 181, 178], [189, 178, 185], [190, 111, 105], [190, 105, 177], [193, 191, 179], [193, 179, 181], [129, 52, 160], [129, 160, 201], [130, 128, 200], [130, 200, 202], [200, 158, 161], [200, 161, 203], [202, 200, 203], [202, 203, 204], [206, 196, 199], [206, 199, 210], [197, 153, 166], [197, 166, 212], [199, 197, 212], [199, 212, 214], [140, 130, 202], [140, 202, 215], [9, 1, 2], [9, 2, 13], [11, 9, 13], [11, 13, 14], [18, 16, 20], [18, 20, 21], [6, 4, 22], [6, 22, 23], [7, 0, 18], [7, 18, 24], [32, 11, 14], [32, 14, 36], [34, 32, 36], [34, 36, 37], [28, 6, 23], [28, 23, 41], [29, 28, 41], [29, 41, 42], [47, 42, 46], [47, 46, 49], [68, 66, 64], [68, 64, 65], [78, 76, 63], [78, 63, 72], [79, 78, 72], [79, 72, 73], [81, 77, 76], [81, 76, 78], [85, 84, 80], [85, 80, 82], [13, 2, 86], [13, 86, 90], [14, 13, 90], [14, 90, 91], [90, 86, 87], [90, 87, 93], [91, 90, 93], [91, 93, 94], [19, 17, 95], [19, 95, 96], [104, 103, 109], [104, 109, 110], [124, 123, 116], [124, 116, 117], [132, 79, 73], [132, 73, 120], [135, 83, 79], [135, 79, 132], [136, 135, 132], [136, 132, 133], [140, 136, 133], [140, 133, 139], [33, 12, 89], [33, 89, 141], [35, 33, 141], [35, 141, 142], [142, 141, 144], [142, 144, 146], [143, 91, 94], [143, 94, 147], [40, 37, 145], [40, 145, 149], [149, 145, 148], [149, 148, 150], [147, 94, 107], [147, 107, 155], [148, 147, 155], [148, 155, 156], [52, 51, 158], [52, 158, 160], [159, 152, 163], [159, 163, 168], [169, 166, 153], [169, 153, 161], [171, 170, 66], [171, 66, 68], [180, 175, 173], [180, 173, 176], [181, 180, 176], [181, 176, 178], [184, 182, 77], [184, 77, 81], [185, 184, 81], [185, 81, 83], [191, 190, 177], [191, 177, 179], [201, 200, 128], [201, 128, 129], [204, 199, 196], [204, 196, 202], [205, 185, 83], [205, 83, 135], [206, 205, 135], [206, 135, 136], [208, 189, 185], [208, 185, 205], [210, 208, 205], [210, 205, 206], [213, 193, 181], [213, 181, 198], [214, 213, 198], [214, 198, 199], [215, 206, 136], [215, 136, 140], [7, 4, 6], [7, 6, 8], [20, 17, 19], [20, 19, 21], [15, 1, 9], [15, 9, 22], [22, 9, 11], [22, 11, 23], [18, 15, 22], [18, 22, 24], [8, 6, 28], [8, 28, 30], [30, 28, 29], [30, 29, 31], [14, 12, 33], [14, 33, 36], [36, 33, 35], [36, 35, 37], [23, 11, 32], [23, 32, 41], [41, 32, 34], [41, 34, 42], [45, 42, 47], [45, 47, 48], [46, 37, 40], [46, 40, 49], [53, 0, 7], [53, 7, 58], [58, 7, 8], [58, 8, 60], [54, 53, 58], [54, 58, 61], [61, 58, 60], [61, 60, 62], [64, 16, 18], [64, 18, 65], [63, 54, 61], [63, 61, 72], [72, 61, 62], [72, 62, 73], [80, 78, 79], [80, 79, 82], [85, 83, 81], [85, 81, 84], [98, 96, 95], [98, 95, 97], [103, 93, 87], [103, 87, 99], [104, 94, 93], [104, 93, 103], [105, 103, 99], [105, 99, 101], [112, 110, 109], [112, 109, 111], [60, 8, 30], [60, 30, 114], [114, 30, 31], [114, 31, 115], [62, 60, 114], [62, 114, 116], [116, 114, 115], [116, 115, 117], [73, 62, 116], [73, 116, 120], [122, 45, 48], [122, 48, 126], [124, 122, 126], [124, 126, 127], [128, 51, 52], [128, 52, 129], [132, 123, 124], [132, 124, 133], [133, 124, 127], [133, 127, 139], [143, 141, 89], [143, 89, 91], [148, 146, 144], [148, 144, 147], [159, 150, 148], [159, 148, 152], [162, 155, 107], [162, 107, 110], [163, 156, 155], [163, 155, 162], [164, 162, 110], [164, 110, 112], [166, 163, 162], [166, 162, 164], [169, 168, 163], [169, 163, 166], [171, 98, 97], [171, 97, 170], [177, 105, 101], [177, 101, 174], [180, 177, 174], [180, 174, 175], [181, 179, 177], [181, 177, 180], [184, 176, 173], [184, 173, 182], [185, 178, 176], [185, 176, 184], [191, 112, 111], [191, 111, 190], [201, 160, 158], [201, 158, 200], [203, 161, 153], [203, 153, 197], [204, 203, 197], [204, 197, 199], [208, 198, 181], [208, 181, 189], [210, 199, 198], [210, 198, 208], [211, 164, 112], [211, 112, 191], [212, 166, 164], [212, 164, 211], [213, 211, 191], [213, 191, 193], [214, 212, 211], [214, 211, 213], [215, 202, 196], [215, 196, 206]]]





;
function cubemesh4() = [
   [
     [-10, -10, -10],
     [10, -10, -10],
     [10, 10, -10],
     [-10, 10, -10],
     [-10, -10, -10],
     [10, -10, -10],
     [10, -10, 10],
     [-10, -10, 10],
     [10, -10, -10],
     [10, 10, -10],
     [10, 10, 10],
     [10, -10, 10],
     [10, 10, -10],
     [-10, 10, -10],
     [-10, 10, 10],
     [10, 10, 10],
     [-10, 10, -10],
     [-10, -10, -10],
     [-10, -10, 10],
     [-10, 10, 10],
     [-10, -10, 10],
     [10, -10, 10],
     [10, 10, 10],
     [-10, 10, 10]
   ],
   [
     [0, 1, 2, 3],
     [7, 6, 5, 4],
     [11, 10, 9, 8],
     [15, 14, 13, 12],
     [19, 18, 17, 16],
    [23, 22, 21, 20]

//,
//     [0, 1, 2],
//     [0,  2, 3]
//,
//     [7, 6, 5],
//     [7,  5, 4],
//     [11, 10, 9],
//     [11, , 9, 8],
//     [15, 14, 13],
//     [15,  13, 12],
//     [19, 18, 17],
//     [19,  17, 16]
//,
//    [23, 22, 21],
//    [23,  21, 20]
 
   ]
 ];
function cubemesh3() = [
   [
     [-10, -10, -10],
     [10, -10, -10],
     [10, 10, -10],
     [-10, 10, -10],
     [-10, -10, -10],
     [10, -10, -10],
     [10, -10, 10],
     [-10, -10, 10],
     [10, -10, -10],
     [10, 10, -10],
     [10, 10, 10],
     [10, -10, 10],
     [10, 10, -10],
     [-10, 10, -10],
     [-10, 10, 10],
     [10, 10, 10],
     [-10, 10, -10],
     [-10, -10, -10],
     [-10, -10, 10],
     [-10, 10, 10],
     [-10, -10, 10],
     [10, -10, 10],
     [10, 10, 10],
     [-10, 10, 10]
   ],
   [
//     [0, 1, 2, 3],
//     [7, 6, 5, 4],
//     [11, 10, 9, 8],
//     [15, 14, 13, 12],
//     [19, 18, 17, 16],
//    [23, 22, 21, 20]

 
     [0, 1, 2],
     [0,  2, 3]
,
     [7, 6, 5],
     [7,  5, 4],
     [11, 10, 9],
     [11, , 9, 8],
     [15, 14, 13],
     [15,  13, 12],
     [19, 18, 17],
     [19,  17, 16]
,
    [23, 22, 21],
    [23,  21, 20]
 
   ]
 ];
